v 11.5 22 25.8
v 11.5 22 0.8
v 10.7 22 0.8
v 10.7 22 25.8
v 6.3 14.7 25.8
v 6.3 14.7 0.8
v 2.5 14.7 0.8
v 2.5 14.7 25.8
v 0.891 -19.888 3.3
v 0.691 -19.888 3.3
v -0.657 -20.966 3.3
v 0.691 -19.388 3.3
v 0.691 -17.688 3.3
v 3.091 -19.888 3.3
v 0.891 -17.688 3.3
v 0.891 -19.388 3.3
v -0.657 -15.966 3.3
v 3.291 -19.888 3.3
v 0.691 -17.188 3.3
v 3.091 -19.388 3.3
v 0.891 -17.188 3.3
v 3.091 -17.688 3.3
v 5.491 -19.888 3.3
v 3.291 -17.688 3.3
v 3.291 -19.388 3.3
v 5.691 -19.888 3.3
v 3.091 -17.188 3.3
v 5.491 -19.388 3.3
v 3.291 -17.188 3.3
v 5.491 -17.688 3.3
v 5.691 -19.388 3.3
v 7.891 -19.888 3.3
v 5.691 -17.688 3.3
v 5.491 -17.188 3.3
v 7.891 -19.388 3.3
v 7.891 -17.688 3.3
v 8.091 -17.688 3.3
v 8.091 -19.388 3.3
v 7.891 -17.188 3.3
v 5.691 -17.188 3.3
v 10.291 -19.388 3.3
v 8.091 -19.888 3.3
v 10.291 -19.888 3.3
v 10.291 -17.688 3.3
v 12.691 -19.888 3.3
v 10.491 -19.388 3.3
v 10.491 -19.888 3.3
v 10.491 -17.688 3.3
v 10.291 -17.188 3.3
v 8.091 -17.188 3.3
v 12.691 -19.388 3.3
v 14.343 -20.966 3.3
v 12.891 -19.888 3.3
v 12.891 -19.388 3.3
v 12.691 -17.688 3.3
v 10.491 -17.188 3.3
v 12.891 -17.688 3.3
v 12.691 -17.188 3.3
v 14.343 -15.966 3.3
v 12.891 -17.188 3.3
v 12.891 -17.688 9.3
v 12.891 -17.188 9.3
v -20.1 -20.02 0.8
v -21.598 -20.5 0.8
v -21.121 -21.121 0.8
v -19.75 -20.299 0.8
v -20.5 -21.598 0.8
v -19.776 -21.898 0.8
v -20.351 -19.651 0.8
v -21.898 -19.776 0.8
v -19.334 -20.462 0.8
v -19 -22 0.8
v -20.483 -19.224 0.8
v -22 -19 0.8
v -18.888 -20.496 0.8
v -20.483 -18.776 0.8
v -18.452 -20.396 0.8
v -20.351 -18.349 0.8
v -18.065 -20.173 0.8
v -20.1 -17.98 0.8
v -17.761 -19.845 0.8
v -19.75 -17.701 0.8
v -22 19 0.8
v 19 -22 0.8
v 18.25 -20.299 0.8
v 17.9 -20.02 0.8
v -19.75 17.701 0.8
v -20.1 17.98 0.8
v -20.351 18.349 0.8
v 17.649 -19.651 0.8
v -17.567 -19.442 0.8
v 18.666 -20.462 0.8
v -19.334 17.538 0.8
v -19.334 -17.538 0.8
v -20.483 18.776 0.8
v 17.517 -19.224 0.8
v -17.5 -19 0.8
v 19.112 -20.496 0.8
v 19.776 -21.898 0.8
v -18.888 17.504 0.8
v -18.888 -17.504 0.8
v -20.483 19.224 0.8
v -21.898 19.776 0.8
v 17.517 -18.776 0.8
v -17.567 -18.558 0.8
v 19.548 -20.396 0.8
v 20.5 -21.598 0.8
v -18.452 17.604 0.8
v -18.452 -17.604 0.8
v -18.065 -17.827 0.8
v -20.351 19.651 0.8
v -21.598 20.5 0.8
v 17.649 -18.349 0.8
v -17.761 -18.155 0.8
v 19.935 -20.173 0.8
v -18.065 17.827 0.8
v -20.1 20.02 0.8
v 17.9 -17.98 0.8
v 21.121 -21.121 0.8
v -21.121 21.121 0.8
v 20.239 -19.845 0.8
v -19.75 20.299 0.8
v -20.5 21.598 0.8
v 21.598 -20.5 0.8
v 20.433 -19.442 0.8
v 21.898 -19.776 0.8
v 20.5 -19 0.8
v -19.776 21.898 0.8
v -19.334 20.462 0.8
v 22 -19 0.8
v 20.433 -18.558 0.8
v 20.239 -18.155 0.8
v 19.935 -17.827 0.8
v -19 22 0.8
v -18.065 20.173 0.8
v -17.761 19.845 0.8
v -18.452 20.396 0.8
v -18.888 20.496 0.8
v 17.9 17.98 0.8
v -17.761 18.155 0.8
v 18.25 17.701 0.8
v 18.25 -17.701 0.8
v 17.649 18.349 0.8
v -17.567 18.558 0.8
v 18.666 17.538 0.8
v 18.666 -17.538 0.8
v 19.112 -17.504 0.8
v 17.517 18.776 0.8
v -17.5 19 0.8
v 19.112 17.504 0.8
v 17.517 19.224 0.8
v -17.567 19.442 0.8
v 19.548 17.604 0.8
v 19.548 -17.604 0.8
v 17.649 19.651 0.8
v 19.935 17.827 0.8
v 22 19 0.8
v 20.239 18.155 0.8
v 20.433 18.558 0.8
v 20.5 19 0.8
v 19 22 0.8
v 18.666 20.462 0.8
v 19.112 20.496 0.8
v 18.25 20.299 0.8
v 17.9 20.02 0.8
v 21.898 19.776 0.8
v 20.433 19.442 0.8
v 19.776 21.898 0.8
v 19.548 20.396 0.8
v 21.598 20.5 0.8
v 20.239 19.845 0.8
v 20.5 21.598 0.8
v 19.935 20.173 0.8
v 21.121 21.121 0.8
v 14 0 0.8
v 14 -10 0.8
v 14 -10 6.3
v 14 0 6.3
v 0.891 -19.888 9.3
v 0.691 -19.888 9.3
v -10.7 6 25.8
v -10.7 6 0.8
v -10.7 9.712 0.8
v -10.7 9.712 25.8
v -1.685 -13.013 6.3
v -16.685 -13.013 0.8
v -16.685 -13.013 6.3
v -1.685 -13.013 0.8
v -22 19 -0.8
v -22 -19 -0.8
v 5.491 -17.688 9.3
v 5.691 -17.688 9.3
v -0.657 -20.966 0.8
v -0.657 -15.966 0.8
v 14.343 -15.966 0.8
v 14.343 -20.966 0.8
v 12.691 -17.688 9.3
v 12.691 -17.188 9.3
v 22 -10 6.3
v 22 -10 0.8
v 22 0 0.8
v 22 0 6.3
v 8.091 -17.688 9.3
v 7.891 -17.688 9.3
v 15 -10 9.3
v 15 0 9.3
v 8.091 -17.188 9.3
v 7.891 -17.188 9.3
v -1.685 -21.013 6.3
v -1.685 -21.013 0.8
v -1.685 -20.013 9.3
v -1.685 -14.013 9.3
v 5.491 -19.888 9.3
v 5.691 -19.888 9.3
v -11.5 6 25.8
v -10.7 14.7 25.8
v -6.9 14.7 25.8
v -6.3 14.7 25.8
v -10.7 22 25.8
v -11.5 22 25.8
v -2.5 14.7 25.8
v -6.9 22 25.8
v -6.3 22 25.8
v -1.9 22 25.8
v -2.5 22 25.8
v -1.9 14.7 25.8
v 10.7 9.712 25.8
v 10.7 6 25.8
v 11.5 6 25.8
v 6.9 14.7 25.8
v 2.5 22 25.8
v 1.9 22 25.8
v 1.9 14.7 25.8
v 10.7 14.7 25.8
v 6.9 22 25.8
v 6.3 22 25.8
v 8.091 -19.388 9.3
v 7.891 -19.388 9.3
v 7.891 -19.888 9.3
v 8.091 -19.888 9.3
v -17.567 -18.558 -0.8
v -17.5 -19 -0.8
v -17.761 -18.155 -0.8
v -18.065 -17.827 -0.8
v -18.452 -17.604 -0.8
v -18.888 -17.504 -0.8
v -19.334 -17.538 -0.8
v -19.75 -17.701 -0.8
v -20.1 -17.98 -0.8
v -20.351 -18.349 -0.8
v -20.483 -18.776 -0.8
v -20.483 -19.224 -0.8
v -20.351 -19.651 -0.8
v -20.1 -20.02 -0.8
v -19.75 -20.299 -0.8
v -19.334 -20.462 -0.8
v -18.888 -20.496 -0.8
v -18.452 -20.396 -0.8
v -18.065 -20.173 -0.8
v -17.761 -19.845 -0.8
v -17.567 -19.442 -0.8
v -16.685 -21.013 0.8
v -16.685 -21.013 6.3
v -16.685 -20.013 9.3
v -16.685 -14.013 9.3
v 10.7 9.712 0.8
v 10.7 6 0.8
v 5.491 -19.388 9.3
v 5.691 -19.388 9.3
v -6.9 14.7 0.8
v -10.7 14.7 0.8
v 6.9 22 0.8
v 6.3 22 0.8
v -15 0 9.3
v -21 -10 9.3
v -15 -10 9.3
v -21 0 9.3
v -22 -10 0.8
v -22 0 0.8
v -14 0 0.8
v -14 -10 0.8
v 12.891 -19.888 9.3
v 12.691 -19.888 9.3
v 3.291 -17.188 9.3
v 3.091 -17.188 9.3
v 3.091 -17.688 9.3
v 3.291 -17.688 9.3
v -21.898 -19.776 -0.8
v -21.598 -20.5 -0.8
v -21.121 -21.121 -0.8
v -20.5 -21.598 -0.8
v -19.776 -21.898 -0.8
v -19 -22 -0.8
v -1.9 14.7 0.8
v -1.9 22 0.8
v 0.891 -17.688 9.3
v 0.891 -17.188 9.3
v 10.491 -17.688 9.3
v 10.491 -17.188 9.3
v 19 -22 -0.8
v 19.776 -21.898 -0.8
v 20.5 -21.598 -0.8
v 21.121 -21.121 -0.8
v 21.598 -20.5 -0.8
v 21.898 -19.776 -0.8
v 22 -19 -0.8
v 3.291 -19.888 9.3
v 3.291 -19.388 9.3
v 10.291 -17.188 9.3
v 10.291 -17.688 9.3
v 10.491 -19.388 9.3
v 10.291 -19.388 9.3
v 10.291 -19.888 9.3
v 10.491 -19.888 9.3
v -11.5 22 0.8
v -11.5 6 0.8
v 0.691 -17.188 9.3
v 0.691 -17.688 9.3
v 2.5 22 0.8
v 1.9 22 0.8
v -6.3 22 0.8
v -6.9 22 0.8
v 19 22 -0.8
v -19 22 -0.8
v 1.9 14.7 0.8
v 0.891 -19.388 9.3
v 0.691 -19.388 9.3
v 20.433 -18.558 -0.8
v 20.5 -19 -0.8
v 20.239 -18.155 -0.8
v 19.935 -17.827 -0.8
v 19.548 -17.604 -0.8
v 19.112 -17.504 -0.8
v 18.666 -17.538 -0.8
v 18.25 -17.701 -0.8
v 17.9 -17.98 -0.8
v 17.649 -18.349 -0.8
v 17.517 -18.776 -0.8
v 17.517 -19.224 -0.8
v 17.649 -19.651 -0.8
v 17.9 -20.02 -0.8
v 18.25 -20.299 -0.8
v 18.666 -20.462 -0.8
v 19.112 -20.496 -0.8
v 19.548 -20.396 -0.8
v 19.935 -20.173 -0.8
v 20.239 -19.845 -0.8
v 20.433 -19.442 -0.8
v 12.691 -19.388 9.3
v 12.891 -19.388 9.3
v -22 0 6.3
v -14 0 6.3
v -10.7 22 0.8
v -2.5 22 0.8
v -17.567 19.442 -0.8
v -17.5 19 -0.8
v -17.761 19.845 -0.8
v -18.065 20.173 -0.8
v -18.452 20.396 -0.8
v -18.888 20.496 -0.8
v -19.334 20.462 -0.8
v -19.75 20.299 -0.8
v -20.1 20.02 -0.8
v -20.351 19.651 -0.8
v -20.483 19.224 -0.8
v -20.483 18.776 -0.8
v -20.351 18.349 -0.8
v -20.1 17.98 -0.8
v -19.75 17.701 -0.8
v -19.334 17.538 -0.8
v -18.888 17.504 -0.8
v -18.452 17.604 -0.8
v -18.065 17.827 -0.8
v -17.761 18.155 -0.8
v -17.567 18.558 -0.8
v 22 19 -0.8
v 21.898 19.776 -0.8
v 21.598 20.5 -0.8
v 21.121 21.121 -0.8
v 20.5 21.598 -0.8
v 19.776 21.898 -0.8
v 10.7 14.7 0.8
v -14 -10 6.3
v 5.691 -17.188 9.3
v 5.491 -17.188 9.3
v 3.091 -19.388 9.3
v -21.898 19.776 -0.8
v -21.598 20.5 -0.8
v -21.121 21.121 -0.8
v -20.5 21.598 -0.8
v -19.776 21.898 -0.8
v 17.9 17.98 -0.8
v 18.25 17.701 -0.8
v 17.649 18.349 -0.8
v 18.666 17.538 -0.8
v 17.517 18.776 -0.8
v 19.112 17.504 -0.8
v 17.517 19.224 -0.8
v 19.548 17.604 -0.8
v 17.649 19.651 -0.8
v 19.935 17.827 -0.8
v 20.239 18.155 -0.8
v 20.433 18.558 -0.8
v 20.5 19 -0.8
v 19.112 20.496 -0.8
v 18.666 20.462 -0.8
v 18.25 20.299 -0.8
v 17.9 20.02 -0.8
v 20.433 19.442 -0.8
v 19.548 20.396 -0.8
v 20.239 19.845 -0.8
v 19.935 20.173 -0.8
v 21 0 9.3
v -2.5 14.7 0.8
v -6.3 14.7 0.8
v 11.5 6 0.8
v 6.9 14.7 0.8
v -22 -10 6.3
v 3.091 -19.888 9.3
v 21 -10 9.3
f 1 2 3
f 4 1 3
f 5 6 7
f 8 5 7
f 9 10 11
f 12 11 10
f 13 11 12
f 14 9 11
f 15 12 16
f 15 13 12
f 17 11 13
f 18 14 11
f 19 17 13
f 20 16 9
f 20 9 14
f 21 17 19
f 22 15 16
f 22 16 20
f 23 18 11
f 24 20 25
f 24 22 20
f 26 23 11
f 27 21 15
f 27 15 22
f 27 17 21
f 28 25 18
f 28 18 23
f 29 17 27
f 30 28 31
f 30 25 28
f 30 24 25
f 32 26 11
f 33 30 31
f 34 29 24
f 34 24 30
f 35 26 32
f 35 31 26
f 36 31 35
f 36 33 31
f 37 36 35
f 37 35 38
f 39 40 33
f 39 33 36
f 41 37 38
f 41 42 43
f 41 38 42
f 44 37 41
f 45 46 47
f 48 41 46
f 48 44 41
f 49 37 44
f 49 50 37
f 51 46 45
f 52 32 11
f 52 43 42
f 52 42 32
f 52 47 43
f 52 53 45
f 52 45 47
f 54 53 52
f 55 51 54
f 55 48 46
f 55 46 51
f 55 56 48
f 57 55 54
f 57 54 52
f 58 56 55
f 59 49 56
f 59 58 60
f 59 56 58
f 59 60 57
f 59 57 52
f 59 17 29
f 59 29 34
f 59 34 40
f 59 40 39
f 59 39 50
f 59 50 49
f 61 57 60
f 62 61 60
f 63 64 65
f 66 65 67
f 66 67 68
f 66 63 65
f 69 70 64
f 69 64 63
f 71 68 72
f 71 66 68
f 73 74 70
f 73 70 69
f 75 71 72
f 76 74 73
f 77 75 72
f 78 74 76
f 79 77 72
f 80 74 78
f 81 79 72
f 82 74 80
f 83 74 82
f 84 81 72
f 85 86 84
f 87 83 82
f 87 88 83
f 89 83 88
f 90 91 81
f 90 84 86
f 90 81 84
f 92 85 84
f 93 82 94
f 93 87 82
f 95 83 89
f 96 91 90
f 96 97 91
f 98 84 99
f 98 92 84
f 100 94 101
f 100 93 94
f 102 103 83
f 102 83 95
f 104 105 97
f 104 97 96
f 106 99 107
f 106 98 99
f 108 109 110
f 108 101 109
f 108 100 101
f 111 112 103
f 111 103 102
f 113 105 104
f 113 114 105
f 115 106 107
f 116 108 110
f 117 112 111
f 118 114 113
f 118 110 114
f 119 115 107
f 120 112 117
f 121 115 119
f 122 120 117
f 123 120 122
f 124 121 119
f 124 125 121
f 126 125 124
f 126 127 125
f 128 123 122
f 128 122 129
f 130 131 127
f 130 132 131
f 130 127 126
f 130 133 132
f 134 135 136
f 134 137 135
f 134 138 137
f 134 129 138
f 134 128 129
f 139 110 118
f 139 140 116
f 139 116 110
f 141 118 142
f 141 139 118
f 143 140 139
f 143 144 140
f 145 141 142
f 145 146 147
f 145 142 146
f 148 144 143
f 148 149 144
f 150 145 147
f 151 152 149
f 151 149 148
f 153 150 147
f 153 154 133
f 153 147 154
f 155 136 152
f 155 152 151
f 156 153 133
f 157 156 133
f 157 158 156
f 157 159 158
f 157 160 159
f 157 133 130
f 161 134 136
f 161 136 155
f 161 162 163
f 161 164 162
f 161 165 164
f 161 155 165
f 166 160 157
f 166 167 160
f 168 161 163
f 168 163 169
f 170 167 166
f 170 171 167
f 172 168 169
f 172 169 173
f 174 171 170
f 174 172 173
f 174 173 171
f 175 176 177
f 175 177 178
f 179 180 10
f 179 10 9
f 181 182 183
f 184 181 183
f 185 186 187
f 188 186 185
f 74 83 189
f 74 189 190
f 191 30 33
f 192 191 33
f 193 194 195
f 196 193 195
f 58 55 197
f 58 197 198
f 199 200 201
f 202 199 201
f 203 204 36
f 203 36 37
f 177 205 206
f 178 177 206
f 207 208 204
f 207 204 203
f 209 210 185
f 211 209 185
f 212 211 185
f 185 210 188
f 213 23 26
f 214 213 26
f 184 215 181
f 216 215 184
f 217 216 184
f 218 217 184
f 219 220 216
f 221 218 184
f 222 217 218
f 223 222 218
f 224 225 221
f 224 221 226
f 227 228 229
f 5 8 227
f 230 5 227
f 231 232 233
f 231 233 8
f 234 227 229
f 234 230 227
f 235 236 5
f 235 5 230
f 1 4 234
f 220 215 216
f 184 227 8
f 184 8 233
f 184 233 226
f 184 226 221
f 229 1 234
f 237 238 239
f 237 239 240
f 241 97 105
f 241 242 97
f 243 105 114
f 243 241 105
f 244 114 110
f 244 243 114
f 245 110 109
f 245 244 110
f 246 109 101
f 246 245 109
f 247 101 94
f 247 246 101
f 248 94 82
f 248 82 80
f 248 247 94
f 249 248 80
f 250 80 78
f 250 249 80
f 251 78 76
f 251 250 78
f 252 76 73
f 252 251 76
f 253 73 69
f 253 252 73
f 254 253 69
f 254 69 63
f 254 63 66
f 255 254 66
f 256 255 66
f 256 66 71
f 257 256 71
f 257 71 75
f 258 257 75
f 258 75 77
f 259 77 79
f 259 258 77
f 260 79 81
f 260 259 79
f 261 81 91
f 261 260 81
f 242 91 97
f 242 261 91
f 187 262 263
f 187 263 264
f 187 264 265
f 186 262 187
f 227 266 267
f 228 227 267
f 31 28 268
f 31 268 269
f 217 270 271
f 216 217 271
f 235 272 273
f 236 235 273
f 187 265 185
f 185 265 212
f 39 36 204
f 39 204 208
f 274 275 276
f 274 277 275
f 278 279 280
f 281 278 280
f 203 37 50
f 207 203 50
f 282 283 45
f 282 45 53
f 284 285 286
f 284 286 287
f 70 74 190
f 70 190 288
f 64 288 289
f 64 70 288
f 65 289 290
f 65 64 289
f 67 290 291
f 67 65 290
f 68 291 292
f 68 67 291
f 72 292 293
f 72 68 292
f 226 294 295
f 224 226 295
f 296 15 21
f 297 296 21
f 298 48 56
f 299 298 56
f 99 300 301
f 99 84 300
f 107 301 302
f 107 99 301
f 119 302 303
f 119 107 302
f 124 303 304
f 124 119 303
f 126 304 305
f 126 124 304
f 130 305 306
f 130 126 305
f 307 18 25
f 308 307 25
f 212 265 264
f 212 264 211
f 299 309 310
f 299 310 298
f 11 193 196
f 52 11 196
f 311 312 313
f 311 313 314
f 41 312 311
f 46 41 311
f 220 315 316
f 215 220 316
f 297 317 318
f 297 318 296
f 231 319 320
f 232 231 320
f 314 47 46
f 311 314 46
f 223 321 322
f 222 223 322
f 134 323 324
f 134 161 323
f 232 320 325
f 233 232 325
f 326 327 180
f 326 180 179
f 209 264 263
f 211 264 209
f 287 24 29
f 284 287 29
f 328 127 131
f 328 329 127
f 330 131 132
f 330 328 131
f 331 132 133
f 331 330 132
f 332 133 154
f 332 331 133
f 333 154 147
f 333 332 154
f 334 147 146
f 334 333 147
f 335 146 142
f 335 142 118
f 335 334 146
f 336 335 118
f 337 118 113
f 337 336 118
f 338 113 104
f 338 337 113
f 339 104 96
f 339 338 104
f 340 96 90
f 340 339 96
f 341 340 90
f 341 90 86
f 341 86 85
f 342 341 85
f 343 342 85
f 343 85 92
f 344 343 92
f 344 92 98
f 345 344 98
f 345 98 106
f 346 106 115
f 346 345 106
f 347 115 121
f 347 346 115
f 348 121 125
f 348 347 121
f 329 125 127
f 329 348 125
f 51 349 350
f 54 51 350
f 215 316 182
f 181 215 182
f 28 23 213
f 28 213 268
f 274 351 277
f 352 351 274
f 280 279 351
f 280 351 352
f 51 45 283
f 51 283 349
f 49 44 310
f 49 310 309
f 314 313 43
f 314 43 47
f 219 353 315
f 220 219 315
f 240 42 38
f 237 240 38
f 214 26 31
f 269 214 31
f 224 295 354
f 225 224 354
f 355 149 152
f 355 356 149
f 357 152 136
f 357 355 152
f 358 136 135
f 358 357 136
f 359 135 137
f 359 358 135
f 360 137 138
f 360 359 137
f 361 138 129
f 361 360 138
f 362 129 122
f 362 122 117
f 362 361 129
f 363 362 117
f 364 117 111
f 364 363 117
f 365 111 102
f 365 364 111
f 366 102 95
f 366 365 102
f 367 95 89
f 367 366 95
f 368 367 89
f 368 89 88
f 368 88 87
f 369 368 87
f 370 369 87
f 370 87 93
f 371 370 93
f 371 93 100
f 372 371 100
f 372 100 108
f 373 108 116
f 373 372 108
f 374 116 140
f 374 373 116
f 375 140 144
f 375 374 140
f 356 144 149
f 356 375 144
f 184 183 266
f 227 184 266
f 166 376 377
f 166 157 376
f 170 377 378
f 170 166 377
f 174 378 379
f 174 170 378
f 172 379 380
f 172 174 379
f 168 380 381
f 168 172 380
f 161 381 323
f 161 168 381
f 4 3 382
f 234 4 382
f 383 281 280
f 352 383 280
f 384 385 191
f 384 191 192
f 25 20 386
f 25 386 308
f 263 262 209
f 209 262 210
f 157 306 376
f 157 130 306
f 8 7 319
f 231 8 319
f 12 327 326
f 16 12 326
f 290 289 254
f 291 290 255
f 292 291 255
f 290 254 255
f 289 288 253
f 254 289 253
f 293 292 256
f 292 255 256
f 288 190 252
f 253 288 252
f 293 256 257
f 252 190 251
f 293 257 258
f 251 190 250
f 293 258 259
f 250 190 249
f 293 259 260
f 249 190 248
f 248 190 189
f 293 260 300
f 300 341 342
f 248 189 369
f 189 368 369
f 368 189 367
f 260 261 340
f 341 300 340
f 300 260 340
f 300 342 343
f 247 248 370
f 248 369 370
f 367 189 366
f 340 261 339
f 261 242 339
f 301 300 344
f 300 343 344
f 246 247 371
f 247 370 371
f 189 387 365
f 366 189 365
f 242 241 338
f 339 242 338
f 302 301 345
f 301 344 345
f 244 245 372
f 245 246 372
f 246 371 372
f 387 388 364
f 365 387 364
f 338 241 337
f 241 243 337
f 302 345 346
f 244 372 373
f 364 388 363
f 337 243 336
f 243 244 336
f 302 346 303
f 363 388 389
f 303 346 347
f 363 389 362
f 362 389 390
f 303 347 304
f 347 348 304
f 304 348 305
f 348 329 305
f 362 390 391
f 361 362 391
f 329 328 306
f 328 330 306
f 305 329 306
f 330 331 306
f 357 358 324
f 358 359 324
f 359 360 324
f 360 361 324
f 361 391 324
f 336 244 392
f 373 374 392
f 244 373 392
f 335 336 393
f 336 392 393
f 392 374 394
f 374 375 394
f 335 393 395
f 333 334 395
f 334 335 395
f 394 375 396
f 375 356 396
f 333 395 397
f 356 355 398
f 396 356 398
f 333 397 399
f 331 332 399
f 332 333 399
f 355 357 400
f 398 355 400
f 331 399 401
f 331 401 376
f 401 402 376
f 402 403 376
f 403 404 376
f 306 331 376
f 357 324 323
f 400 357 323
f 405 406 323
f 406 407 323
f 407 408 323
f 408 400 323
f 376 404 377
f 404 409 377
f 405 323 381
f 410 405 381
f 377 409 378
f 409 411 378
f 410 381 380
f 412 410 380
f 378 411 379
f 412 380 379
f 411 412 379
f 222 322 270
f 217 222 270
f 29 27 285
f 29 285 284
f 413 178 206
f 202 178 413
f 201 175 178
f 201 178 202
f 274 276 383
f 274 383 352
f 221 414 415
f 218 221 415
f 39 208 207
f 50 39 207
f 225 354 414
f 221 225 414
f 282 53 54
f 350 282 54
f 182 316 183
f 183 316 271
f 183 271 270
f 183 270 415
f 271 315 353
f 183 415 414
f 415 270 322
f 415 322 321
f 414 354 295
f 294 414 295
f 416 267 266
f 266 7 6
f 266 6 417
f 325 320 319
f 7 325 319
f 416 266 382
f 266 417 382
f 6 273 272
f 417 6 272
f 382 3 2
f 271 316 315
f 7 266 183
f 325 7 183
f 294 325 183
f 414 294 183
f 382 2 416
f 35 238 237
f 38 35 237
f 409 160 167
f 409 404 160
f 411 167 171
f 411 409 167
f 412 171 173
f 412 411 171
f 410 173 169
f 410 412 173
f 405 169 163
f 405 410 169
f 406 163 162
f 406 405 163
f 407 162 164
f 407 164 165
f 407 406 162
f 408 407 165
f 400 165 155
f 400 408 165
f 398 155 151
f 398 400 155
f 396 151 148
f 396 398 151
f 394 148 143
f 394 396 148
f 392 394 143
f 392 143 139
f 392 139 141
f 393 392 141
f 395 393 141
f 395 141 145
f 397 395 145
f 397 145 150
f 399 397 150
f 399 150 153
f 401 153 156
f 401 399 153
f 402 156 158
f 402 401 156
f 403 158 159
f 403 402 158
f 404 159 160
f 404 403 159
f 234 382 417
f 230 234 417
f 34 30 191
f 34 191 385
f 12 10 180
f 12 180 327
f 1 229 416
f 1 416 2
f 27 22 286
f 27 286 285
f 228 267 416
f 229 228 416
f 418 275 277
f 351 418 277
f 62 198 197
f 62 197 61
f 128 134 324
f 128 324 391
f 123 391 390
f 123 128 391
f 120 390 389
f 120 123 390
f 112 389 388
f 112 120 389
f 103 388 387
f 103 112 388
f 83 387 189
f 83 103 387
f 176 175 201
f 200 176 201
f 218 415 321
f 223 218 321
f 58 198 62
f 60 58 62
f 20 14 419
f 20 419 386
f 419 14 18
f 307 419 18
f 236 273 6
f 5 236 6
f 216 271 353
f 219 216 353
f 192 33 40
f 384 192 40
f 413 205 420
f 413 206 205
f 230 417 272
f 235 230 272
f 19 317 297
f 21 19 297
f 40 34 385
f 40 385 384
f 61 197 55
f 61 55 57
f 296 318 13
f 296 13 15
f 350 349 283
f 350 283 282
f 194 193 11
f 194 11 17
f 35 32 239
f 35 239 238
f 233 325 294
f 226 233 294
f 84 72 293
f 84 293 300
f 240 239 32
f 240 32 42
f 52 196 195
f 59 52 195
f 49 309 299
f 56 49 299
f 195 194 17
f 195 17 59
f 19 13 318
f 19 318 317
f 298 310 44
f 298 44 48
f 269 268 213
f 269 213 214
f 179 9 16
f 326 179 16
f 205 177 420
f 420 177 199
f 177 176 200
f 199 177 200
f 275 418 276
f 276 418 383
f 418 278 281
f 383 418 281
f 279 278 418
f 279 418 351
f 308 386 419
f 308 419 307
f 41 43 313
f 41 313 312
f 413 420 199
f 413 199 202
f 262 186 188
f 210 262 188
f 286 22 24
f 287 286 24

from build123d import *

# Parameters (mm, degrees)
F0_R      = 1.5
F1_DEPTH  = 0.8
F3_DEPTH  = 25
F4_W      = 15
F4_H      = 8
F4_W_2    = 8
F4_H_2    = 10
F5_DEPTH  = 8.5
F6_SIZE2  = 1
F6_SIZE   = 3
F7_W      = 15
F7_H      = 5
F8_DEPTH  = 2.5
F9_W      = 0.2
F9_H      = 0.5
F10_DEPTH = 6


with BuildPart() as f1:
    # F0 (on Top) → F1 (new body, symmetric)
    with BuildSketch(Plane.XY):
        with BuildLine():
            Line((19, 22), (-19, 22))
            ThreePointArc((-19, 22), (-21.12132, 21.12132), (-22, 19))
            Line((-22, 19), (-22, -19))
            ThreePointArc((-22, -19), (-21.12132, -21.12132), (-19, -22))
            Line((-19, -22), (19, -22))
            ThreePointArc((19, -22), (21.12132, -21.12132), (22, -19))
            Line((22, -19), (22, 19))
            ThreePointArc((22, 19), (21.12132, 21.12132), (19, 22))
        make_face()
        with Locations((-19, -19)):
            Circle(F0_R, mode=Mode.SUBTRACT)
        with Locations((19, -19)):
            Circle(F0_R, mode=Mode.SUBTRACT)
        with Locations((-19, 19)):
            Circle(F0_R, mode=Mode.SUBTRACT)
        with Locations((19, 19)):
            Circle(F0_R, mode=Mode.SUBTRACT)
    extrude(amount=F1_DEPTH, both=True)


with BuildPart() as f3:
    # F2 (on face) → F3 (new body)
    with BuildSketch(Plane.XY.offset(0.8)):
        Polygon((-10.7, 22), (-11.5, 22), (-11.5, 6), (-10.7, 6), (-10.7, 9.711665), (10.7, 9.711665), (10.7, 6), (11.5, 6), (11.5, 22), (10.7, 22), (10.7, 14.7), (6.9, 14.7), (6.9, 22), (6.3, 22), (6.3, 14.7), (2.5, 14.7), (2.5, 22), (1.9, 22), (1.9, 14.7), (-1.9, 14.7), (-1.9, 22), (-2.5, 22), (-2.5, 14.7), (-6.3, 14.7), (-6.3, 22), (-6.9, 22), (-6.9, 14.7), (-10.7, 14.7), align=None)
    extrude(amount=F3_DEPTH)


with BuildPart() as f5:
    # F4 (on face) → F5 (new body)
    with BuildSketch(Plane.XY.offset(0.8)):
        with Locations((-9.185456, -17.013481)):
            Rectangle(F4_W, F4_H)
        with Locations((-18, -5)):
            Rectangle(F4_W_2, F4_H_2)
        with Locations((18, -5)):
            Rectangle(F4_W_2, F4_H_2)
    extrude(amount=F5_DEPTH)

    # F6
    f6_edges = [f5.edges().sort_by_distance(p)[0] for p in [
        (22, -5, 9.3),
        (14, -5, 9.3),
        (-14, -5, 9.3),
        (-9.185456, -21.013481, 9.3),
        (-22, -5, 9.3),
        (-9.185456, -13.013481, 9.3),
    ]]
    chamfer(f6_edges, length=F6_SIZE, length2=F6_SIZE2)


with BuildPart() as f8:
    # F7 (on face) → F8 (new body)
    with BuildSketch(Plane.XY.offset(0.8)):
        with Locations((6.84347, -18.466163)):
            Rectangle(F7_W, F7_H)
    extrude(amount=F8_DEPTH)

    # F9 (on face) → F10 (join)
    with BuildSketch(Plane.XY.offset(3.3)):
        with Locations((0.791427, -19.638107)):
            Rectangle(F9_W, F9_H)
        with Locations((0.791427, -17.438107)):
            Rectangle(F9_W, F9_H)
        with Locations((3.191427, -17.438107)):
            Rectangle(F9_W, F9_H)
        with Locations((3.191427, -19.638107)):
            Rectangle(F9_W, F9_H)
        with Locations((5.591427, -19.638107)):
            Rectangle(F9_W, F9_H)
        with Locations((5.591427, -17.438107)):
            Rectangle(F9_W, F9_H)
        with Locations((7.991427, -17.438107)):
            Rectangle(F9_W, F9_H)
        with Locations((7.991427, -19.638107)):
            Rectangle(F9_W, F9_H)
        with Locations((10.391427, -19.638107)):
            Rectangle(F9_W, F9_H)
        with Locations((10.391427, -17.438107)):
            Rectangle(F9_W, F9_H)
        with Locations((12.791427, -17.438107)):
            Rectangle(F9_W, F9_H)
        with Locations((12.791427, -19.638107)):
            Rectangle(F9_W, F9_H)
    extrude(amount=F10_DEPTH)


solid = Compound([f1.part, f3.part, f5.part, f8.part])
